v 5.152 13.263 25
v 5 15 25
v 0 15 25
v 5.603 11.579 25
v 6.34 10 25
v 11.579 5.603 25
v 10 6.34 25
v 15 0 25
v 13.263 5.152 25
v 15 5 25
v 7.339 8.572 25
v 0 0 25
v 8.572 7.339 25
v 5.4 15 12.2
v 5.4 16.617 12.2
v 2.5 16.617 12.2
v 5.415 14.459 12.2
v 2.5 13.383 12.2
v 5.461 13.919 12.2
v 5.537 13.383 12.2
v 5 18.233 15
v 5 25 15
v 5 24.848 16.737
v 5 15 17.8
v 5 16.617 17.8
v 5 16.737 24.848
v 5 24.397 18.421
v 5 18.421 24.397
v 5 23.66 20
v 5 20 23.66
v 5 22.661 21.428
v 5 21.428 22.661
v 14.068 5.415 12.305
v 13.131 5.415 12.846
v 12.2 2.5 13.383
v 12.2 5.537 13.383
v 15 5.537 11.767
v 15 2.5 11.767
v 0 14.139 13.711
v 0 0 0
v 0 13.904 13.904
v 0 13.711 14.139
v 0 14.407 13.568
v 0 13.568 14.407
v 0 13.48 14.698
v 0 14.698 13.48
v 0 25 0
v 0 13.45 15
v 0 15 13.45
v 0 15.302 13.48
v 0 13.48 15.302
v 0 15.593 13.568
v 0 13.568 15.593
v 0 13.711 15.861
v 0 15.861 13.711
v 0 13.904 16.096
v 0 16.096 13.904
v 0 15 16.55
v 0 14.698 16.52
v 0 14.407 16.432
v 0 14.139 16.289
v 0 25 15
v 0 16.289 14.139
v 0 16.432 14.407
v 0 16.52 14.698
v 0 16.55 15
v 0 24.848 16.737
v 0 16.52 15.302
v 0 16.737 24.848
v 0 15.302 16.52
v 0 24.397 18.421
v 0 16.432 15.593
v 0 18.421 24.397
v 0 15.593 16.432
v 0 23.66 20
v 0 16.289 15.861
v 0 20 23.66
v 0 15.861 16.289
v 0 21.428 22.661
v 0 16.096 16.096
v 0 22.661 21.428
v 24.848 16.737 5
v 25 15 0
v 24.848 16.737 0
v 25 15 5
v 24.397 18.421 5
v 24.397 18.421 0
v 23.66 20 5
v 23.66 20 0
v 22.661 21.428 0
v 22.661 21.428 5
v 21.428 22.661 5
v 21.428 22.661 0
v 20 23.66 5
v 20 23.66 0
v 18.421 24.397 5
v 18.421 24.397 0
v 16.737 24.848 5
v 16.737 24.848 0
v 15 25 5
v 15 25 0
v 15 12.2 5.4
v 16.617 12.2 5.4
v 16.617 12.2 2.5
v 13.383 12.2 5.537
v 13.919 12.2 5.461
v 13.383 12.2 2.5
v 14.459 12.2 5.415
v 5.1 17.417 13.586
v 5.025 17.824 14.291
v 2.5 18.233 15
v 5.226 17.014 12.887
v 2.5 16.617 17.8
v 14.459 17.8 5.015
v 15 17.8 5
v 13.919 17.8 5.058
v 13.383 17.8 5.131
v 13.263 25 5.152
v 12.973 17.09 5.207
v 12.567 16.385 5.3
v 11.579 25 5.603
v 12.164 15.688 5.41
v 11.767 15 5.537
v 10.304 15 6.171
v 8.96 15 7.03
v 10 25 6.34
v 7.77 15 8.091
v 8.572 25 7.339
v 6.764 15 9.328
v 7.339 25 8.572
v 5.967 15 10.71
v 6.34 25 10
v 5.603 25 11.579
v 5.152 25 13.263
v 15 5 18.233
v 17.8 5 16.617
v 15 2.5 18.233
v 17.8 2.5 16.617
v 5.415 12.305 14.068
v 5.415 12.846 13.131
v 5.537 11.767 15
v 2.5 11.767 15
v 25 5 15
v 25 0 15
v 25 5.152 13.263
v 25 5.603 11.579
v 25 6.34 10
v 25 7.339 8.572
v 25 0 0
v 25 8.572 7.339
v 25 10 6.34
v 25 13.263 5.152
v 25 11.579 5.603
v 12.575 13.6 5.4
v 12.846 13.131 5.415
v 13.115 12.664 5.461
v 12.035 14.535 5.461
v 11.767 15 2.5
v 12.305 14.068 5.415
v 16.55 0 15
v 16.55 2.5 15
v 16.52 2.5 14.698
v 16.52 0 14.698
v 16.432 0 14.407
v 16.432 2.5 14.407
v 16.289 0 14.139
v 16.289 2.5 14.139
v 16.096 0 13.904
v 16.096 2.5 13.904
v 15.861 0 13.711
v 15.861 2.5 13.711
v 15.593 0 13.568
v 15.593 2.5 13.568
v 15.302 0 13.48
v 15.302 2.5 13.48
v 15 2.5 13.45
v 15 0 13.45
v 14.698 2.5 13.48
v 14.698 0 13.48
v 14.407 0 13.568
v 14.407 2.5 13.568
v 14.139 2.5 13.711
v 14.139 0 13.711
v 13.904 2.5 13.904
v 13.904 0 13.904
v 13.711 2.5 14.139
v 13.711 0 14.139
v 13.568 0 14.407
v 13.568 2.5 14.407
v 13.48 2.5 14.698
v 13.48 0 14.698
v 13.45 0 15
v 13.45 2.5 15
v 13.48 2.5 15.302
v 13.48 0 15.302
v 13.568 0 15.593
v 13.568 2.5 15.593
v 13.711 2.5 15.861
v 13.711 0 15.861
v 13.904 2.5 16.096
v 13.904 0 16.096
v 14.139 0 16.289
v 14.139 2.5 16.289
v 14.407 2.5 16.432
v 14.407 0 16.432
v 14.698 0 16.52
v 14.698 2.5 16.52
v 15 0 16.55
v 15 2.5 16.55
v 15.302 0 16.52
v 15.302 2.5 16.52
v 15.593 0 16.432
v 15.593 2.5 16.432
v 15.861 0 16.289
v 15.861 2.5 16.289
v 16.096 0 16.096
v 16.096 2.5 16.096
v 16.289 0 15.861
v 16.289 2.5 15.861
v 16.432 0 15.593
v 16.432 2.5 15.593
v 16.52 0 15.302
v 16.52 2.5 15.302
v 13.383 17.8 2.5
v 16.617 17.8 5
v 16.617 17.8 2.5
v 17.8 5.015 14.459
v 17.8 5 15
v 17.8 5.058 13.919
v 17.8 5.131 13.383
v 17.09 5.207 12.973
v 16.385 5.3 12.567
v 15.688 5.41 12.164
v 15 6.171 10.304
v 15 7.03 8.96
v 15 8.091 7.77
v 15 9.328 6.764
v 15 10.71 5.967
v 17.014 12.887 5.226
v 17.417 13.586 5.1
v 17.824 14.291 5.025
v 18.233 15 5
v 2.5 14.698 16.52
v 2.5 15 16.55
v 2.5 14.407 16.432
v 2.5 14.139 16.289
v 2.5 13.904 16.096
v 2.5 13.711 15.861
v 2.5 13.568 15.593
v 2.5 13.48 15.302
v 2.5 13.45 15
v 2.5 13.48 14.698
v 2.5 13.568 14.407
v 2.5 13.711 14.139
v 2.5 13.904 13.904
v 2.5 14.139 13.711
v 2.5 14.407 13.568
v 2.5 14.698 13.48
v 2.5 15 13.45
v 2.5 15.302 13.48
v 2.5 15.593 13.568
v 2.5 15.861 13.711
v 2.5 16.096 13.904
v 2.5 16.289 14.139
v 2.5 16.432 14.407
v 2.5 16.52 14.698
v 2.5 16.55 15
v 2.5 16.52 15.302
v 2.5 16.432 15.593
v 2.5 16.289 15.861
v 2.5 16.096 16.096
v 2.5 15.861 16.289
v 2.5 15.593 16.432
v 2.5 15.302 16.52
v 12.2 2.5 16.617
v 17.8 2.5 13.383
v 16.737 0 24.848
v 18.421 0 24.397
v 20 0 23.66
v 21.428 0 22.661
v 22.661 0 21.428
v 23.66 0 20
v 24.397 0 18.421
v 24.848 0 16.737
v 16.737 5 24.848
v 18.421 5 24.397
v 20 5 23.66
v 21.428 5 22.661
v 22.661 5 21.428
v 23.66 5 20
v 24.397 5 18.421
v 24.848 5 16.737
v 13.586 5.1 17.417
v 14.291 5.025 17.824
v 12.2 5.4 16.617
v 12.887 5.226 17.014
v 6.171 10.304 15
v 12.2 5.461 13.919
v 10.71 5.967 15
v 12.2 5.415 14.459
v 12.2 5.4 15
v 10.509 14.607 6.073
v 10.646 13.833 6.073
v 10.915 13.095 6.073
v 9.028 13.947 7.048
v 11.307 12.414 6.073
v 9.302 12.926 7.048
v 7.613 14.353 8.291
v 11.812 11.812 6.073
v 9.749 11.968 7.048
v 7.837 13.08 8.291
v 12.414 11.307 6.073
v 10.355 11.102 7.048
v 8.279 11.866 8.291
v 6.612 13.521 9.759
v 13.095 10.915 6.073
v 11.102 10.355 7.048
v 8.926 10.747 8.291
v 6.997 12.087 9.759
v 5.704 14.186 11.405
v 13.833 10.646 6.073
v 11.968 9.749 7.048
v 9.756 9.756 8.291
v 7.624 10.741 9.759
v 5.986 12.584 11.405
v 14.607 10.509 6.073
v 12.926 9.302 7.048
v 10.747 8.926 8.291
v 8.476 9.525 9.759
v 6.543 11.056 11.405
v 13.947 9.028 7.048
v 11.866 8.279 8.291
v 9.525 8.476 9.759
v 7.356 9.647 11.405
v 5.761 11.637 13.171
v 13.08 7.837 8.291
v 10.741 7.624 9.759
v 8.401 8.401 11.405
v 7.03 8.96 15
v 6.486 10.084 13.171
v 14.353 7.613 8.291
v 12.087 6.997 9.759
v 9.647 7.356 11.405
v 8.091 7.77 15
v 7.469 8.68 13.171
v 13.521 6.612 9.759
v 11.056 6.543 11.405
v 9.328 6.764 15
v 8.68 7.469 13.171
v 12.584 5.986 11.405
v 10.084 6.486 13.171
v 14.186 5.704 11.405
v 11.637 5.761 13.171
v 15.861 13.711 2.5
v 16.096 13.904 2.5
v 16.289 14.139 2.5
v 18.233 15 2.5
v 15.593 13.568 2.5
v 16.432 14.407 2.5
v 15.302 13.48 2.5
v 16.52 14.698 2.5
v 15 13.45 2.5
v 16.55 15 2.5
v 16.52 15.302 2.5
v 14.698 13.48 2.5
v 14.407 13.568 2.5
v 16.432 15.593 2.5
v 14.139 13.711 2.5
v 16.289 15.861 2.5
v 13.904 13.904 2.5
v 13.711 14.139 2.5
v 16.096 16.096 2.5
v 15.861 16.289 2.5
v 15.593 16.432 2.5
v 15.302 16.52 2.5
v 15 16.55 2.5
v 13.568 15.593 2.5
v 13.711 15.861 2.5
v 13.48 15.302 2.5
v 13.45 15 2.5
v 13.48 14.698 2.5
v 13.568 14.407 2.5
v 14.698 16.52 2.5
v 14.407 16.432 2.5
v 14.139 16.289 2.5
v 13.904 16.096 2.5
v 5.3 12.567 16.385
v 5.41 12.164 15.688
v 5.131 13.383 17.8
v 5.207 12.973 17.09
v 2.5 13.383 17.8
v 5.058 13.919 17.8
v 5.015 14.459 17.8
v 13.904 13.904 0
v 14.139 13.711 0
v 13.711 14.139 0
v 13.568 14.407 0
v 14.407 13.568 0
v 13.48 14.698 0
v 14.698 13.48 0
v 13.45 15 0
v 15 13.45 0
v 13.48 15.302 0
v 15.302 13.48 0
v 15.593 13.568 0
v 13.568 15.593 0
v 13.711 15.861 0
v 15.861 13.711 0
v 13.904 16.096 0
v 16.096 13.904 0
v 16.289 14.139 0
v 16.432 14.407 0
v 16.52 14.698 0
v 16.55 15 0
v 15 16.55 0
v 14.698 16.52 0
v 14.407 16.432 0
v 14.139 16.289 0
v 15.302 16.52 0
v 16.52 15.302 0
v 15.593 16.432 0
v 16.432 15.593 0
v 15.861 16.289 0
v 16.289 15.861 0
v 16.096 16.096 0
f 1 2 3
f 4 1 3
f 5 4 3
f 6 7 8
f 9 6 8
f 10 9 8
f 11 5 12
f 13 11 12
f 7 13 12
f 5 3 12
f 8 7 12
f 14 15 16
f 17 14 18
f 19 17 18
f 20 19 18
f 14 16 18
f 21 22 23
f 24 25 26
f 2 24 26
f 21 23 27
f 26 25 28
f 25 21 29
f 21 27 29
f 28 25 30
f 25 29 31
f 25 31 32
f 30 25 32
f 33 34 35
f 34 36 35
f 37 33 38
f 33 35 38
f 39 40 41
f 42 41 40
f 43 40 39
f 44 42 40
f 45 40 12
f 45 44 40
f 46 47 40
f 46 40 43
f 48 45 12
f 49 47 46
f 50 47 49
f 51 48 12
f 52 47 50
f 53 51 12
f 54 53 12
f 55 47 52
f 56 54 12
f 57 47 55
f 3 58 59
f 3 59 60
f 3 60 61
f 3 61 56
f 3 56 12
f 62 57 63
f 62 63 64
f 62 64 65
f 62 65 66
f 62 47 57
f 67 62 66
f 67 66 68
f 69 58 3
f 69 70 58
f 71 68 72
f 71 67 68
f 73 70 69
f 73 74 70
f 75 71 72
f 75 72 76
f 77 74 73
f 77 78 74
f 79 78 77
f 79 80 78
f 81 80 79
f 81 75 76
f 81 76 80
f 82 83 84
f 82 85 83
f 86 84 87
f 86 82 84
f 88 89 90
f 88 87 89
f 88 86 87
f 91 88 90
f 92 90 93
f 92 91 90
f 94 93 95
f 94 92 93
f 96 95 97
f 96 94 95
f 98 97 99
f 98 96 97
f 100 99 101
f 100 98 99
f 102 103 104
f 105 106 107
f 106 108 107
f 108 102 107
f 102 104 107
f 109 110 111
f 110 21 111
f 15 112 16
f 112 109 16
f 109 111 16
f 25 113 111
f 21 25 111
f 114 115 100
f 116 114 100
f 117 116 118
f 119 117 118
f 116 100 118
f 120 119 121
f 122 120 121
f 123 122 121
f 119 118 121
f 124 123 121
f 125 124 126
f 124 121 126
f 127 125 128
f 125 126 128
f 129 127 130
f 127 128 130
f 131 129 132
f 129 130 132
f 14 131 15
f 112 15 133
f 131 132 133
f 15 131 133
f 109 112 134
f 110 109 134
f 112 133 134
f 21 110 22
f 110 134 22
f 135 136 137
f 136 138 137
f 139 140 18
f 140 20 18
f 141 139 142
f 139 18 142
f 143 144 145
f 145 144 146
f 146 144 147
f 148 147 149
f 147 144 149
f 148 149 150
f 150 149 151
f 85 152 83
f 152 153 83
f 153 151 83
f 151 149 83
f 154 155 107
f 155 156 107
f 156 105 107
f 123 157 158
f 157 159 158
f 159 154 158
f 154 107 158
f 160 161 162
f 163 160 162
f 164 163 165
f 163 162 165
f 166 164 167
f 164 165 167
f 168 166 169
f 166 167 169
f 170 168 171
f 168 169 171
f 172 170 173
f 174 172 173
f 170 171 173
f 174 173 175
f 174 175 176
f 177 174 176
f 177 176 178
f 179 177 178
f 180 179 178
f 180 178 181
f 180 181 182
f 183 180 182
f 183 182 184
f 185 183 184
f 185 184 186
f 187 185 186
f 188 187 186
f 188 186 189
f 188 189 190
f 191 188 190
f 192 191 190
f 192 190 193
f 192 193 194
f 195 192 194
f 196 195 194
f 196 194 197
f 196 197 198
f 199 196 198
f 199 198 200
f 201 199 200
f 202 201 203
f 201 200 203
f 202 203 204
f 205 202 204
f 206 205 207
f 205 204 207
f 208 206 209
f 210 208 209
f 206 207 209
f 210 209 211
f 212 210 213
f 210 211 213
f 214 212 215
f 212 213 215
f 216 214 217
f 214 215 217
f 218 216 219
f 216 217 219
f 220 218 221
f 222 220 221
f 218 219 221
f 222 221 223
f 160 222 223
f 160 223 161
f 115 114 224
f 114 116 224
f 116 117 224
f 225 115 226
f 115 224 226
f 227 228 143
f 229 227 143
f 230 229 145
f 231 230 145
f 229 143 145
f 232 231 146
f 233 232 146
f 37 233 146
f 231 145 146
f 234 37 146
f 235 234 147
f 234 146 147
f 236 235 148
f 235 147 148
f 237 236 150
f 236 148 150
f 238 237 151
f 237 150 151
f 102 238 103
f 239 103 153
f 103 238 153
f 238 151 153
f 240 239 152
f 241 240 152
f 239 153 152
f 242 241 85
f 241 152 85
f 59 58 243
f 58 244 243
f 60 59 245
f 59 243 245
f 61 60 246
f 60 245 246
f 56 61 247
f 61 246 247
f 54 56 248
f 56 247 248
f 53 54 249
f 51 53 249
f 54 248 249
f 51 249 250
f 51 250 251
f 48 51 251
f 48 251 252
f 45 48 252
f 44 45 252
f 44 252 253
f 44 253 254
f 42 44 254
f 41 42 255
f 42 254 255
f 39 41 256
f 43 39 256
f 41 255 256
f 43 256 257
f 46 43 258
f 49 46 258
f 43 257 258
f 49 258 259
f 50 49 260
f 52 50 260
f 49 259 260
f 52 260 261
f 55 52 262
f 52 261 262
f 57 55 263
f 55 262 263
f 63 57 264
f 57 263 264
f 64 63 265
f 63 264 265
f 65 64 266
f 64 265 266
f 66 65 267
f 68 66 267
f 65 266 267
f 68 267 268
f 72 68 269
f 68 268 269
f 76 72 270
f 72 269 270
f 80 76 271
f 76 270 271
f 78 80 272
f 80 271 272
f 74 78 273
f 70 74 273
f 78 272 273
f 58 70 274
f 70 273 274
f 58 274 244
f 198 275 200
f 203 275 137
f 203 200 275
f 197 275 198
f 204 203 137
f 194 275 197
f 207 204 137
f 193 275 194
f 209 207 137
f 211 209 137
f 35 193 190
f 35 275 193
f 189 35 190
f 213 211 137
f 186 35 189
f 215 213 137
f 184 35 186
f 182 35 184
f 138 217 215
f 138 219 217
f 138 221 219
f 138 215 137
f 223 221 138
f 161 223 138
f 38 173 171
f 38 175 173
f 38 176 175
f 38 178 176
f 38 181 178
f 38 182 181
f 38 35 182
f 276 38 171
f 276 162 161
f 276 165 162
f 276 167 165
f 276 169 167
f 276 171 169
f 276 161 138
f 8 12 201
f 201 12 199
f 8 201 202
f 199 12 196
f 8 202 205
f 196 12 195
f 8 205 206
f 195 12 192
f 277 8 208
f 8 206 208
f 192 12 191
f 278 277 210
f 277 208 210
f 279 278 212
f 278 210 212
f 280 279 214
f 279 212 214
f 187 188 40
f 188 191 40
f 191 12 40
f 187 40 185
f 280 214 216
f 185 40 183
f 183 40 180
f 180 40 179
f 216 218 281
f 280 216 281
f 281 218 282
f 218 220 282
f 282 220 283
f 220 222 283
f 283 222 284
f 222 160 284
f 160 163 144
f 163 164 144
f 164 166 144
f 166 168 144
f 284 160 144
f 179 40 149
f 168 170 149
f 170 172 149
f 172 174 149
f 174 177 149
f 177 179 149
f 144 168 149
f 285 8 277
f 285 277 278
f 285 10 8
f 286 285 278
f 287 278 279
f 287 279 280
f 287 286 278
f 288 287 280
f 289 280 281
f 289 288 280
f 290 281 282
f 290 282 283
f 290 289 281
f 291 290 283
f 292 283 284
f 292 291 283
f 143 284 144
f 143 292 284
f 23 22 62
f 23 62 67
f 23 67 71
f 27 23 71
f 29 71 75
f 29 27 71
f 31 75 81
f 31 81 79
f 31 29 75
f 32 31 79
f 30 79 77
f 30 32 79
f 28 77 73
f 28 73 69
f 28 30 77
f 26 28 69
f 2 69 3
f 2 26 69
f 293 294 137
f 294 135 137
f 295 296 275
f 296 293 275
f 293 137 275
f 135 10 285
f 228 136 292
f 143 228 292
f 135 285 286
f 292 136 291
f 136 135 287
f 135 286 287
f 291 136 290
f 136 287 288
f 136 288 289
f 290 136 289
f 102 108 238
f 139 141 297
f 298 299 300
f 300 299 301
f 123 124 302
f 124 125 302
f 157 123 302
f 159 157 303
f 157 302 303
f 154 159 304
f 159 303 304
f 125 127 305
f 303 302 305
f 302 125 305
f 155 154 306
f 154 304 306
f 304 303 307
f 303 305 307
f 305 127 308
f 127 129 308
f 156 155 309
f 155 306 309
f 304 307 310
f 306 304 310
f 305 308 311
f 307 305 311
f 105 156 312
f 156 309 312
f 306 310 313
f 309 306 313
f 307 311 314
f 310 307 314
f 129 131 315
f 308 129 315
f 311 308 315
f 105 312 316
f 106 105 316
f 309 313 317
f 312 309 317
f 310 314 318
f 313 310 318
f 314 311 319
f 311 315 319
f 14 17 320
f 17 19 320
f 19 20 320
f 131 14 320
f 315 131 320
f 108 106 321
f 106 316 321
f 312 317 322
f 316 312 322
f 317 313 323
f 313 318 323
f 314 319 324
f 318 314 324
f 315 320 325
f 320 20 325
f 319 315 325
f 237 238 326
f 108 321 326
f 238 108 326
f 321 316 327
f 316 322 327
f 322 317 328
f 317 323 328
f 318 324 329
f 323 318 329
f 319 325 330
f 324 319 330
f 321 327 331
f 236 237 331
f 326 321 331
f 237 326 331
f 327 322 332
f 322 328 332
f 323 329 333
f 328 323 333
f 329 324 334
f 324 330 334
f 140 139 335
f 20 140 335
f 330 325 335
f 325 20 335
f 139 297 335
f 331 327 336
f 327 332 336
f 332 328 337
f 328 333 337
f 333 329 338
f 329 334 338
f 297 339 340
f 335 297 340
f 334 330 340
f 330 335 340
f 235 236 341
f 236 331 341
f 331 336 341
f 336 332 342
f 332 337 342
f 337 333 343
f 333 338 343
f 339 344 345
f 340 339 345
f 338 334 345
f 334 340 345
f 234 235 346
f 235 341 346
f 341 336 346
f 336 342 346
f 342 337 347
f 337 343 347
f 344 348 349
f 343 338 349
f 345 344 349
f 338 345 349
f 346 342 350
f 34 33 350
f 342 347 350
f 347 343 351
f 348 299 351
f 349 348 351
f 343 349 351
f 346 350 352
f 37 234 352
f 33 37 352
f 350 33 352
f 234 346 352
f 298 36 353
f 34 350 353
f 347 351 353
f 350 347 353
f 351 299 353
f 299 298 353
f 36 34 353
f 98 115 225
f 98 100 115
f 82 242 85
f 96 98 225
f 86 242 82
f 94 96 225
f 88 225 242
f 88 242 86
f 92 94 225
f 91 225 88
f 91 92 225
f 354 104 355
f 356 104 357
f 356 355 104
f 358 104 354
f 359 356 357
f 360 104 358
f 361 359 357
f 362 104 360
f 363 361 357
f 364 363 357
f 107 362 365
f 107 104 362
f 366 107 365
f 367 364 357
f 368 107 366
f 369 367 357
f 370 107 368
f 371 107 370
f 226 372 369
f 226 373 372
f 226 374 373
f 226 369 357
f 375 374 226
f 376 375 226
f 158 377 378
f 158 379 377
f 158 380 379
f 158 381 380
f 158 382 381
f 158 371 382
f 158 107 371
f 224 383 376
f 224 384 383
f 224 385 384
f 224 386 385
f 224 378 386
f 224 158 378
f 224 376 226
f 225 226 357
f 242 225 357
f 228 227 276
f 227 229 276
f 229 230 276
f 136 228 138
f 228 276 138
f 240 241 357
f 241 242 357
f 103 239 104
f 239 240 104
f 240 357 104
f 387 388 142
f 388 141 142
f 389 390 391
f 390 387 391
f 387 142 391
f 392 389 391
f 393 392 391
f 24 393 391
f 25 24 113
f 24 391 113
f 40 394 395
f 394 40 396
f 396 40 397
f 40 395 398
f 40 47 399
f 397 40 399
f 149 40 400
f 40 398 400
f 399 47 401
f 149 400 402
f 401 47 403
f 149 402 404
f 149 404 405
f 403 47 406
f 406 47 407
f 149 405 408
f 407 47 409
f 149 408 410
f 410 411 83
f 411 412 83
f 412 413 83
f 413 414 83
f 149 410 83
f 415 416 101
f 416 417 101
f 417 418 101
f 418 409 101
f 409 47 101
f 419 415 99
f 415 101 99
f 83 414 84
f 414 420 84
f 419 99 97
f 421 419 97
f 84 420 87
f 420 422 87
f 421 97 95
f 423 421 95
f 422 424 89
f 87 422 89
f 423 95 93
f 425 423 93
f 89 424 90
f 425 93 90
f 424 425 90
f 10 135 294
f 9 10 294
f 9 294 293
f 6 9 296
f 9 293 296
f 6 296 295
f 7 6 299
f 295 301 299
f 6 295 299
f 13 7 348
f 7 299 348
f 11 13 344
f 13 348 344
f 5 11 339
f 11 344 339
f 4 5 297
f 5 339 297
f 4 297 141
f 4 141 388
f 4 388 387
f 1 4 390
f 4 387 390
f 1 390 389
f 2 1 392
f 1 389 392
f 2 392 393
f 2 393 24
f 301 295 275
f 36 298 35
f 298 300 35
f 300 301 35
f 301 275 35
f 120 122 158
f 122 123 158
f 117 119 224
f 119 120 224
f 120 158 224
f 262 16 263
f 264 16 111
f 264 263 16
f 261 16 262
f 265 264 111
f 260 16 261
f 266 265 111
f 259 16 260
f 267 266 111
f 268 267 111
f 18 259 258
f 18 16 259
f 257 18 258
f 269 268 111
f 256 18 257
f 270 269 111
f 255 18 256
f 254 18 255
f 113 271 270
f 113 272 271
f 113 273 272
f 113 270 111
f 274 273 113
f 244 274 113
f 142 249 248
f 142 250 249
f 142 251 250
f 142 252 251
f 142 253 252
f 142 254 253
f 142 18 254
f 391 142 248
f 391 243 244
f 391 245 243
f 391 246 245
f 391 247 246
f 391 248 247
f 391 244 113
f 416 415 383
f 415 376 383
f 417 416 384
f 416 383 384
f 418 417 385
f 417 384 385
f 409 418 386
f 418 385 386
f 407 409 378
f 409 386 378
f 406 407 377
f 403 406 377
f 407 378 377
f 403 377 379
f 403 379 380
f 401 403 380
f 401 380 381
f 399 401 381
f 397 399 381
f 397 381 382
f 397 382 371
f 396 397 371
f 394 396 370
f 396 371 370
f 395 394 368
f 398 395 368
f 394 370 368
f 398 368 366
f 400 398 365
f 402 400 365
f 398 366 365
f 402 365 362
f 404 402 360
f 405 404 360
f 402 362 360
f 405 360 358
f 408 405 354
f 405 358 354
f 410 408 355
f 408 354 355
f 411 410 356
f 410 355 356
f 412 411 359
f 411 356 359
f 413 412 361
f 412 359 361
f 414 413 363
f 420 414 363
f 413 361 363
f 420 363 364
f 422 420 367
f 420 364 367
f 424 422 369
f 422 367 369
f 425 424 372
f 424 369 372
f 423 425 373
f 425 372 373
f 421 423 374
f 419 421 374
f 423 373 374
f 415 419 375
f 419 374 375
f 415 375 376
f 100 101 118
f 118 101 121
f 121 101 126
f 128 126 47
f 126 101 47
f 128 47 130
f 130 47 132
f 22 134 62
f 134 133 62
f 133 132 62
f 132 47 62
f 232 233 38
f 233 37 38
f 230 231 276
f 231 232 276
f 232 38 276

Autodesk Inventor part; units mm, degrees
ref_plane "YZ Plane" through (0, 0, 0) normal (1, 0, 0) x (0, 1, 0)
ref_plane "XZ Plane" through (0, 0, 0) normal (0, 1, 0) x (-1, 0, 0)
ref_plane "XY Plane" through (0, 0, 0) normal (0, 0, 1) x (1, 0, 0)
sketch "Sketch1" plane through (0, 0, 0) normal (0, 0, 1) x (1, 0, 0)
  line L0 (0, 0) -> (25, 0)
  line L1 (25, 0) -> (25, 25)
  line L2 (25, 25) -> (0, 25)
  line L3 (0, 25) -> (0, 0)
  dimension "d0" = 25
extrude "Extrusion1" add sketch "Sketch1" along normal blind 5
sketch "Sketch2" plane through (0, 0, 0) normal (0, -1, 0) x (1, 0, 0)
  line L0 (0, 0) -> (25, 0) projected
  line L1 (25, 0) -> (25, 5) projected
  line L2 (0, 5) -> (25, 5) projected
  line L3 (0, 0) -> (0, 5) projected
  line L4 (0, 0) -> (25, 0)
  line L5 (25, 0) -> (25, 25)
  line L6 (25, 25) -> (0, 25)
  line L7 (0, 25) -> (0, 0)
extrude "Extrusion2" add sketch "Sketch2" against normal blind 5 contours L7 L6 L5 L2
sketch "Sketch3" plane through (0, 0, 0) normal (-1, 0, 0) x (0, 0, 1)
  line L0 (5, 25) -> (25, 25)
  line L1 (25, 25) -> (25, 5)
  line L2 (25, 5) -> (5, 5)
  line L3 (5, 5) -> (5, 25)
extrude "Extrusion3" add sketch "Sketch3" against normal blind 5
fillet "Fillet2" radius 10 6 edges at (5, 5, 15) (5, 15, 5) (15, 5, 5) (2.5, 25, 25) (25, 2.5, 25) (25, 25, 2.5)
sketch "Sketch6" plane through (0, 5, 0) normal (0, 1, 0) x (1, 0, 0)
  arc A0 (15, -25) -> (25, -15) centre (15, -15) ccw projected
  circle A1 centre (15, -15) radius 1.55
  point P0 (0, 0)
  dimension "d20" = 3.1
extrude "Extrusion6" cut sketch "Sketch6" along normal through all both and the other way through all
sketch "Sketch7" plane through (0, 5, 0) normal (0, 1, 0) x (1, 0, 0)
  line L0 (15, -25) -> (15, -16.55) projected
  arc A0 (15, -25) -> (25, -15) centre (15, -15) ccw projected
  line L1 (15, -18.2332) -> (12.2, -16.6166)
  line L2 (12.2, -16.6166) -> (12.2, -13.3834)
  line L3 (12.2, -13.3834) -> (15, -11.7668)
  line L4 (15, -11.7668) -> (17.8, -13.3834)
  line L5 (17.8, -13.3834) -> (17.8, -16.6166)
  line L6 (17.8, -16.6166) -> (15, -18.2332)
  point P0 (0, 0)
  dimension "d24" = 5.6
extrude "Extrusion7" cut sketch "Sketch7" along normal mid plane 5
pattern_circular "Circular Pattern2" count 3 over 360 about axis through (0, 0, 0) along (0.5774, 0.5774, 0.5774) of "Extrusion7", "Extrusion6"
properties part number "corner tab"
